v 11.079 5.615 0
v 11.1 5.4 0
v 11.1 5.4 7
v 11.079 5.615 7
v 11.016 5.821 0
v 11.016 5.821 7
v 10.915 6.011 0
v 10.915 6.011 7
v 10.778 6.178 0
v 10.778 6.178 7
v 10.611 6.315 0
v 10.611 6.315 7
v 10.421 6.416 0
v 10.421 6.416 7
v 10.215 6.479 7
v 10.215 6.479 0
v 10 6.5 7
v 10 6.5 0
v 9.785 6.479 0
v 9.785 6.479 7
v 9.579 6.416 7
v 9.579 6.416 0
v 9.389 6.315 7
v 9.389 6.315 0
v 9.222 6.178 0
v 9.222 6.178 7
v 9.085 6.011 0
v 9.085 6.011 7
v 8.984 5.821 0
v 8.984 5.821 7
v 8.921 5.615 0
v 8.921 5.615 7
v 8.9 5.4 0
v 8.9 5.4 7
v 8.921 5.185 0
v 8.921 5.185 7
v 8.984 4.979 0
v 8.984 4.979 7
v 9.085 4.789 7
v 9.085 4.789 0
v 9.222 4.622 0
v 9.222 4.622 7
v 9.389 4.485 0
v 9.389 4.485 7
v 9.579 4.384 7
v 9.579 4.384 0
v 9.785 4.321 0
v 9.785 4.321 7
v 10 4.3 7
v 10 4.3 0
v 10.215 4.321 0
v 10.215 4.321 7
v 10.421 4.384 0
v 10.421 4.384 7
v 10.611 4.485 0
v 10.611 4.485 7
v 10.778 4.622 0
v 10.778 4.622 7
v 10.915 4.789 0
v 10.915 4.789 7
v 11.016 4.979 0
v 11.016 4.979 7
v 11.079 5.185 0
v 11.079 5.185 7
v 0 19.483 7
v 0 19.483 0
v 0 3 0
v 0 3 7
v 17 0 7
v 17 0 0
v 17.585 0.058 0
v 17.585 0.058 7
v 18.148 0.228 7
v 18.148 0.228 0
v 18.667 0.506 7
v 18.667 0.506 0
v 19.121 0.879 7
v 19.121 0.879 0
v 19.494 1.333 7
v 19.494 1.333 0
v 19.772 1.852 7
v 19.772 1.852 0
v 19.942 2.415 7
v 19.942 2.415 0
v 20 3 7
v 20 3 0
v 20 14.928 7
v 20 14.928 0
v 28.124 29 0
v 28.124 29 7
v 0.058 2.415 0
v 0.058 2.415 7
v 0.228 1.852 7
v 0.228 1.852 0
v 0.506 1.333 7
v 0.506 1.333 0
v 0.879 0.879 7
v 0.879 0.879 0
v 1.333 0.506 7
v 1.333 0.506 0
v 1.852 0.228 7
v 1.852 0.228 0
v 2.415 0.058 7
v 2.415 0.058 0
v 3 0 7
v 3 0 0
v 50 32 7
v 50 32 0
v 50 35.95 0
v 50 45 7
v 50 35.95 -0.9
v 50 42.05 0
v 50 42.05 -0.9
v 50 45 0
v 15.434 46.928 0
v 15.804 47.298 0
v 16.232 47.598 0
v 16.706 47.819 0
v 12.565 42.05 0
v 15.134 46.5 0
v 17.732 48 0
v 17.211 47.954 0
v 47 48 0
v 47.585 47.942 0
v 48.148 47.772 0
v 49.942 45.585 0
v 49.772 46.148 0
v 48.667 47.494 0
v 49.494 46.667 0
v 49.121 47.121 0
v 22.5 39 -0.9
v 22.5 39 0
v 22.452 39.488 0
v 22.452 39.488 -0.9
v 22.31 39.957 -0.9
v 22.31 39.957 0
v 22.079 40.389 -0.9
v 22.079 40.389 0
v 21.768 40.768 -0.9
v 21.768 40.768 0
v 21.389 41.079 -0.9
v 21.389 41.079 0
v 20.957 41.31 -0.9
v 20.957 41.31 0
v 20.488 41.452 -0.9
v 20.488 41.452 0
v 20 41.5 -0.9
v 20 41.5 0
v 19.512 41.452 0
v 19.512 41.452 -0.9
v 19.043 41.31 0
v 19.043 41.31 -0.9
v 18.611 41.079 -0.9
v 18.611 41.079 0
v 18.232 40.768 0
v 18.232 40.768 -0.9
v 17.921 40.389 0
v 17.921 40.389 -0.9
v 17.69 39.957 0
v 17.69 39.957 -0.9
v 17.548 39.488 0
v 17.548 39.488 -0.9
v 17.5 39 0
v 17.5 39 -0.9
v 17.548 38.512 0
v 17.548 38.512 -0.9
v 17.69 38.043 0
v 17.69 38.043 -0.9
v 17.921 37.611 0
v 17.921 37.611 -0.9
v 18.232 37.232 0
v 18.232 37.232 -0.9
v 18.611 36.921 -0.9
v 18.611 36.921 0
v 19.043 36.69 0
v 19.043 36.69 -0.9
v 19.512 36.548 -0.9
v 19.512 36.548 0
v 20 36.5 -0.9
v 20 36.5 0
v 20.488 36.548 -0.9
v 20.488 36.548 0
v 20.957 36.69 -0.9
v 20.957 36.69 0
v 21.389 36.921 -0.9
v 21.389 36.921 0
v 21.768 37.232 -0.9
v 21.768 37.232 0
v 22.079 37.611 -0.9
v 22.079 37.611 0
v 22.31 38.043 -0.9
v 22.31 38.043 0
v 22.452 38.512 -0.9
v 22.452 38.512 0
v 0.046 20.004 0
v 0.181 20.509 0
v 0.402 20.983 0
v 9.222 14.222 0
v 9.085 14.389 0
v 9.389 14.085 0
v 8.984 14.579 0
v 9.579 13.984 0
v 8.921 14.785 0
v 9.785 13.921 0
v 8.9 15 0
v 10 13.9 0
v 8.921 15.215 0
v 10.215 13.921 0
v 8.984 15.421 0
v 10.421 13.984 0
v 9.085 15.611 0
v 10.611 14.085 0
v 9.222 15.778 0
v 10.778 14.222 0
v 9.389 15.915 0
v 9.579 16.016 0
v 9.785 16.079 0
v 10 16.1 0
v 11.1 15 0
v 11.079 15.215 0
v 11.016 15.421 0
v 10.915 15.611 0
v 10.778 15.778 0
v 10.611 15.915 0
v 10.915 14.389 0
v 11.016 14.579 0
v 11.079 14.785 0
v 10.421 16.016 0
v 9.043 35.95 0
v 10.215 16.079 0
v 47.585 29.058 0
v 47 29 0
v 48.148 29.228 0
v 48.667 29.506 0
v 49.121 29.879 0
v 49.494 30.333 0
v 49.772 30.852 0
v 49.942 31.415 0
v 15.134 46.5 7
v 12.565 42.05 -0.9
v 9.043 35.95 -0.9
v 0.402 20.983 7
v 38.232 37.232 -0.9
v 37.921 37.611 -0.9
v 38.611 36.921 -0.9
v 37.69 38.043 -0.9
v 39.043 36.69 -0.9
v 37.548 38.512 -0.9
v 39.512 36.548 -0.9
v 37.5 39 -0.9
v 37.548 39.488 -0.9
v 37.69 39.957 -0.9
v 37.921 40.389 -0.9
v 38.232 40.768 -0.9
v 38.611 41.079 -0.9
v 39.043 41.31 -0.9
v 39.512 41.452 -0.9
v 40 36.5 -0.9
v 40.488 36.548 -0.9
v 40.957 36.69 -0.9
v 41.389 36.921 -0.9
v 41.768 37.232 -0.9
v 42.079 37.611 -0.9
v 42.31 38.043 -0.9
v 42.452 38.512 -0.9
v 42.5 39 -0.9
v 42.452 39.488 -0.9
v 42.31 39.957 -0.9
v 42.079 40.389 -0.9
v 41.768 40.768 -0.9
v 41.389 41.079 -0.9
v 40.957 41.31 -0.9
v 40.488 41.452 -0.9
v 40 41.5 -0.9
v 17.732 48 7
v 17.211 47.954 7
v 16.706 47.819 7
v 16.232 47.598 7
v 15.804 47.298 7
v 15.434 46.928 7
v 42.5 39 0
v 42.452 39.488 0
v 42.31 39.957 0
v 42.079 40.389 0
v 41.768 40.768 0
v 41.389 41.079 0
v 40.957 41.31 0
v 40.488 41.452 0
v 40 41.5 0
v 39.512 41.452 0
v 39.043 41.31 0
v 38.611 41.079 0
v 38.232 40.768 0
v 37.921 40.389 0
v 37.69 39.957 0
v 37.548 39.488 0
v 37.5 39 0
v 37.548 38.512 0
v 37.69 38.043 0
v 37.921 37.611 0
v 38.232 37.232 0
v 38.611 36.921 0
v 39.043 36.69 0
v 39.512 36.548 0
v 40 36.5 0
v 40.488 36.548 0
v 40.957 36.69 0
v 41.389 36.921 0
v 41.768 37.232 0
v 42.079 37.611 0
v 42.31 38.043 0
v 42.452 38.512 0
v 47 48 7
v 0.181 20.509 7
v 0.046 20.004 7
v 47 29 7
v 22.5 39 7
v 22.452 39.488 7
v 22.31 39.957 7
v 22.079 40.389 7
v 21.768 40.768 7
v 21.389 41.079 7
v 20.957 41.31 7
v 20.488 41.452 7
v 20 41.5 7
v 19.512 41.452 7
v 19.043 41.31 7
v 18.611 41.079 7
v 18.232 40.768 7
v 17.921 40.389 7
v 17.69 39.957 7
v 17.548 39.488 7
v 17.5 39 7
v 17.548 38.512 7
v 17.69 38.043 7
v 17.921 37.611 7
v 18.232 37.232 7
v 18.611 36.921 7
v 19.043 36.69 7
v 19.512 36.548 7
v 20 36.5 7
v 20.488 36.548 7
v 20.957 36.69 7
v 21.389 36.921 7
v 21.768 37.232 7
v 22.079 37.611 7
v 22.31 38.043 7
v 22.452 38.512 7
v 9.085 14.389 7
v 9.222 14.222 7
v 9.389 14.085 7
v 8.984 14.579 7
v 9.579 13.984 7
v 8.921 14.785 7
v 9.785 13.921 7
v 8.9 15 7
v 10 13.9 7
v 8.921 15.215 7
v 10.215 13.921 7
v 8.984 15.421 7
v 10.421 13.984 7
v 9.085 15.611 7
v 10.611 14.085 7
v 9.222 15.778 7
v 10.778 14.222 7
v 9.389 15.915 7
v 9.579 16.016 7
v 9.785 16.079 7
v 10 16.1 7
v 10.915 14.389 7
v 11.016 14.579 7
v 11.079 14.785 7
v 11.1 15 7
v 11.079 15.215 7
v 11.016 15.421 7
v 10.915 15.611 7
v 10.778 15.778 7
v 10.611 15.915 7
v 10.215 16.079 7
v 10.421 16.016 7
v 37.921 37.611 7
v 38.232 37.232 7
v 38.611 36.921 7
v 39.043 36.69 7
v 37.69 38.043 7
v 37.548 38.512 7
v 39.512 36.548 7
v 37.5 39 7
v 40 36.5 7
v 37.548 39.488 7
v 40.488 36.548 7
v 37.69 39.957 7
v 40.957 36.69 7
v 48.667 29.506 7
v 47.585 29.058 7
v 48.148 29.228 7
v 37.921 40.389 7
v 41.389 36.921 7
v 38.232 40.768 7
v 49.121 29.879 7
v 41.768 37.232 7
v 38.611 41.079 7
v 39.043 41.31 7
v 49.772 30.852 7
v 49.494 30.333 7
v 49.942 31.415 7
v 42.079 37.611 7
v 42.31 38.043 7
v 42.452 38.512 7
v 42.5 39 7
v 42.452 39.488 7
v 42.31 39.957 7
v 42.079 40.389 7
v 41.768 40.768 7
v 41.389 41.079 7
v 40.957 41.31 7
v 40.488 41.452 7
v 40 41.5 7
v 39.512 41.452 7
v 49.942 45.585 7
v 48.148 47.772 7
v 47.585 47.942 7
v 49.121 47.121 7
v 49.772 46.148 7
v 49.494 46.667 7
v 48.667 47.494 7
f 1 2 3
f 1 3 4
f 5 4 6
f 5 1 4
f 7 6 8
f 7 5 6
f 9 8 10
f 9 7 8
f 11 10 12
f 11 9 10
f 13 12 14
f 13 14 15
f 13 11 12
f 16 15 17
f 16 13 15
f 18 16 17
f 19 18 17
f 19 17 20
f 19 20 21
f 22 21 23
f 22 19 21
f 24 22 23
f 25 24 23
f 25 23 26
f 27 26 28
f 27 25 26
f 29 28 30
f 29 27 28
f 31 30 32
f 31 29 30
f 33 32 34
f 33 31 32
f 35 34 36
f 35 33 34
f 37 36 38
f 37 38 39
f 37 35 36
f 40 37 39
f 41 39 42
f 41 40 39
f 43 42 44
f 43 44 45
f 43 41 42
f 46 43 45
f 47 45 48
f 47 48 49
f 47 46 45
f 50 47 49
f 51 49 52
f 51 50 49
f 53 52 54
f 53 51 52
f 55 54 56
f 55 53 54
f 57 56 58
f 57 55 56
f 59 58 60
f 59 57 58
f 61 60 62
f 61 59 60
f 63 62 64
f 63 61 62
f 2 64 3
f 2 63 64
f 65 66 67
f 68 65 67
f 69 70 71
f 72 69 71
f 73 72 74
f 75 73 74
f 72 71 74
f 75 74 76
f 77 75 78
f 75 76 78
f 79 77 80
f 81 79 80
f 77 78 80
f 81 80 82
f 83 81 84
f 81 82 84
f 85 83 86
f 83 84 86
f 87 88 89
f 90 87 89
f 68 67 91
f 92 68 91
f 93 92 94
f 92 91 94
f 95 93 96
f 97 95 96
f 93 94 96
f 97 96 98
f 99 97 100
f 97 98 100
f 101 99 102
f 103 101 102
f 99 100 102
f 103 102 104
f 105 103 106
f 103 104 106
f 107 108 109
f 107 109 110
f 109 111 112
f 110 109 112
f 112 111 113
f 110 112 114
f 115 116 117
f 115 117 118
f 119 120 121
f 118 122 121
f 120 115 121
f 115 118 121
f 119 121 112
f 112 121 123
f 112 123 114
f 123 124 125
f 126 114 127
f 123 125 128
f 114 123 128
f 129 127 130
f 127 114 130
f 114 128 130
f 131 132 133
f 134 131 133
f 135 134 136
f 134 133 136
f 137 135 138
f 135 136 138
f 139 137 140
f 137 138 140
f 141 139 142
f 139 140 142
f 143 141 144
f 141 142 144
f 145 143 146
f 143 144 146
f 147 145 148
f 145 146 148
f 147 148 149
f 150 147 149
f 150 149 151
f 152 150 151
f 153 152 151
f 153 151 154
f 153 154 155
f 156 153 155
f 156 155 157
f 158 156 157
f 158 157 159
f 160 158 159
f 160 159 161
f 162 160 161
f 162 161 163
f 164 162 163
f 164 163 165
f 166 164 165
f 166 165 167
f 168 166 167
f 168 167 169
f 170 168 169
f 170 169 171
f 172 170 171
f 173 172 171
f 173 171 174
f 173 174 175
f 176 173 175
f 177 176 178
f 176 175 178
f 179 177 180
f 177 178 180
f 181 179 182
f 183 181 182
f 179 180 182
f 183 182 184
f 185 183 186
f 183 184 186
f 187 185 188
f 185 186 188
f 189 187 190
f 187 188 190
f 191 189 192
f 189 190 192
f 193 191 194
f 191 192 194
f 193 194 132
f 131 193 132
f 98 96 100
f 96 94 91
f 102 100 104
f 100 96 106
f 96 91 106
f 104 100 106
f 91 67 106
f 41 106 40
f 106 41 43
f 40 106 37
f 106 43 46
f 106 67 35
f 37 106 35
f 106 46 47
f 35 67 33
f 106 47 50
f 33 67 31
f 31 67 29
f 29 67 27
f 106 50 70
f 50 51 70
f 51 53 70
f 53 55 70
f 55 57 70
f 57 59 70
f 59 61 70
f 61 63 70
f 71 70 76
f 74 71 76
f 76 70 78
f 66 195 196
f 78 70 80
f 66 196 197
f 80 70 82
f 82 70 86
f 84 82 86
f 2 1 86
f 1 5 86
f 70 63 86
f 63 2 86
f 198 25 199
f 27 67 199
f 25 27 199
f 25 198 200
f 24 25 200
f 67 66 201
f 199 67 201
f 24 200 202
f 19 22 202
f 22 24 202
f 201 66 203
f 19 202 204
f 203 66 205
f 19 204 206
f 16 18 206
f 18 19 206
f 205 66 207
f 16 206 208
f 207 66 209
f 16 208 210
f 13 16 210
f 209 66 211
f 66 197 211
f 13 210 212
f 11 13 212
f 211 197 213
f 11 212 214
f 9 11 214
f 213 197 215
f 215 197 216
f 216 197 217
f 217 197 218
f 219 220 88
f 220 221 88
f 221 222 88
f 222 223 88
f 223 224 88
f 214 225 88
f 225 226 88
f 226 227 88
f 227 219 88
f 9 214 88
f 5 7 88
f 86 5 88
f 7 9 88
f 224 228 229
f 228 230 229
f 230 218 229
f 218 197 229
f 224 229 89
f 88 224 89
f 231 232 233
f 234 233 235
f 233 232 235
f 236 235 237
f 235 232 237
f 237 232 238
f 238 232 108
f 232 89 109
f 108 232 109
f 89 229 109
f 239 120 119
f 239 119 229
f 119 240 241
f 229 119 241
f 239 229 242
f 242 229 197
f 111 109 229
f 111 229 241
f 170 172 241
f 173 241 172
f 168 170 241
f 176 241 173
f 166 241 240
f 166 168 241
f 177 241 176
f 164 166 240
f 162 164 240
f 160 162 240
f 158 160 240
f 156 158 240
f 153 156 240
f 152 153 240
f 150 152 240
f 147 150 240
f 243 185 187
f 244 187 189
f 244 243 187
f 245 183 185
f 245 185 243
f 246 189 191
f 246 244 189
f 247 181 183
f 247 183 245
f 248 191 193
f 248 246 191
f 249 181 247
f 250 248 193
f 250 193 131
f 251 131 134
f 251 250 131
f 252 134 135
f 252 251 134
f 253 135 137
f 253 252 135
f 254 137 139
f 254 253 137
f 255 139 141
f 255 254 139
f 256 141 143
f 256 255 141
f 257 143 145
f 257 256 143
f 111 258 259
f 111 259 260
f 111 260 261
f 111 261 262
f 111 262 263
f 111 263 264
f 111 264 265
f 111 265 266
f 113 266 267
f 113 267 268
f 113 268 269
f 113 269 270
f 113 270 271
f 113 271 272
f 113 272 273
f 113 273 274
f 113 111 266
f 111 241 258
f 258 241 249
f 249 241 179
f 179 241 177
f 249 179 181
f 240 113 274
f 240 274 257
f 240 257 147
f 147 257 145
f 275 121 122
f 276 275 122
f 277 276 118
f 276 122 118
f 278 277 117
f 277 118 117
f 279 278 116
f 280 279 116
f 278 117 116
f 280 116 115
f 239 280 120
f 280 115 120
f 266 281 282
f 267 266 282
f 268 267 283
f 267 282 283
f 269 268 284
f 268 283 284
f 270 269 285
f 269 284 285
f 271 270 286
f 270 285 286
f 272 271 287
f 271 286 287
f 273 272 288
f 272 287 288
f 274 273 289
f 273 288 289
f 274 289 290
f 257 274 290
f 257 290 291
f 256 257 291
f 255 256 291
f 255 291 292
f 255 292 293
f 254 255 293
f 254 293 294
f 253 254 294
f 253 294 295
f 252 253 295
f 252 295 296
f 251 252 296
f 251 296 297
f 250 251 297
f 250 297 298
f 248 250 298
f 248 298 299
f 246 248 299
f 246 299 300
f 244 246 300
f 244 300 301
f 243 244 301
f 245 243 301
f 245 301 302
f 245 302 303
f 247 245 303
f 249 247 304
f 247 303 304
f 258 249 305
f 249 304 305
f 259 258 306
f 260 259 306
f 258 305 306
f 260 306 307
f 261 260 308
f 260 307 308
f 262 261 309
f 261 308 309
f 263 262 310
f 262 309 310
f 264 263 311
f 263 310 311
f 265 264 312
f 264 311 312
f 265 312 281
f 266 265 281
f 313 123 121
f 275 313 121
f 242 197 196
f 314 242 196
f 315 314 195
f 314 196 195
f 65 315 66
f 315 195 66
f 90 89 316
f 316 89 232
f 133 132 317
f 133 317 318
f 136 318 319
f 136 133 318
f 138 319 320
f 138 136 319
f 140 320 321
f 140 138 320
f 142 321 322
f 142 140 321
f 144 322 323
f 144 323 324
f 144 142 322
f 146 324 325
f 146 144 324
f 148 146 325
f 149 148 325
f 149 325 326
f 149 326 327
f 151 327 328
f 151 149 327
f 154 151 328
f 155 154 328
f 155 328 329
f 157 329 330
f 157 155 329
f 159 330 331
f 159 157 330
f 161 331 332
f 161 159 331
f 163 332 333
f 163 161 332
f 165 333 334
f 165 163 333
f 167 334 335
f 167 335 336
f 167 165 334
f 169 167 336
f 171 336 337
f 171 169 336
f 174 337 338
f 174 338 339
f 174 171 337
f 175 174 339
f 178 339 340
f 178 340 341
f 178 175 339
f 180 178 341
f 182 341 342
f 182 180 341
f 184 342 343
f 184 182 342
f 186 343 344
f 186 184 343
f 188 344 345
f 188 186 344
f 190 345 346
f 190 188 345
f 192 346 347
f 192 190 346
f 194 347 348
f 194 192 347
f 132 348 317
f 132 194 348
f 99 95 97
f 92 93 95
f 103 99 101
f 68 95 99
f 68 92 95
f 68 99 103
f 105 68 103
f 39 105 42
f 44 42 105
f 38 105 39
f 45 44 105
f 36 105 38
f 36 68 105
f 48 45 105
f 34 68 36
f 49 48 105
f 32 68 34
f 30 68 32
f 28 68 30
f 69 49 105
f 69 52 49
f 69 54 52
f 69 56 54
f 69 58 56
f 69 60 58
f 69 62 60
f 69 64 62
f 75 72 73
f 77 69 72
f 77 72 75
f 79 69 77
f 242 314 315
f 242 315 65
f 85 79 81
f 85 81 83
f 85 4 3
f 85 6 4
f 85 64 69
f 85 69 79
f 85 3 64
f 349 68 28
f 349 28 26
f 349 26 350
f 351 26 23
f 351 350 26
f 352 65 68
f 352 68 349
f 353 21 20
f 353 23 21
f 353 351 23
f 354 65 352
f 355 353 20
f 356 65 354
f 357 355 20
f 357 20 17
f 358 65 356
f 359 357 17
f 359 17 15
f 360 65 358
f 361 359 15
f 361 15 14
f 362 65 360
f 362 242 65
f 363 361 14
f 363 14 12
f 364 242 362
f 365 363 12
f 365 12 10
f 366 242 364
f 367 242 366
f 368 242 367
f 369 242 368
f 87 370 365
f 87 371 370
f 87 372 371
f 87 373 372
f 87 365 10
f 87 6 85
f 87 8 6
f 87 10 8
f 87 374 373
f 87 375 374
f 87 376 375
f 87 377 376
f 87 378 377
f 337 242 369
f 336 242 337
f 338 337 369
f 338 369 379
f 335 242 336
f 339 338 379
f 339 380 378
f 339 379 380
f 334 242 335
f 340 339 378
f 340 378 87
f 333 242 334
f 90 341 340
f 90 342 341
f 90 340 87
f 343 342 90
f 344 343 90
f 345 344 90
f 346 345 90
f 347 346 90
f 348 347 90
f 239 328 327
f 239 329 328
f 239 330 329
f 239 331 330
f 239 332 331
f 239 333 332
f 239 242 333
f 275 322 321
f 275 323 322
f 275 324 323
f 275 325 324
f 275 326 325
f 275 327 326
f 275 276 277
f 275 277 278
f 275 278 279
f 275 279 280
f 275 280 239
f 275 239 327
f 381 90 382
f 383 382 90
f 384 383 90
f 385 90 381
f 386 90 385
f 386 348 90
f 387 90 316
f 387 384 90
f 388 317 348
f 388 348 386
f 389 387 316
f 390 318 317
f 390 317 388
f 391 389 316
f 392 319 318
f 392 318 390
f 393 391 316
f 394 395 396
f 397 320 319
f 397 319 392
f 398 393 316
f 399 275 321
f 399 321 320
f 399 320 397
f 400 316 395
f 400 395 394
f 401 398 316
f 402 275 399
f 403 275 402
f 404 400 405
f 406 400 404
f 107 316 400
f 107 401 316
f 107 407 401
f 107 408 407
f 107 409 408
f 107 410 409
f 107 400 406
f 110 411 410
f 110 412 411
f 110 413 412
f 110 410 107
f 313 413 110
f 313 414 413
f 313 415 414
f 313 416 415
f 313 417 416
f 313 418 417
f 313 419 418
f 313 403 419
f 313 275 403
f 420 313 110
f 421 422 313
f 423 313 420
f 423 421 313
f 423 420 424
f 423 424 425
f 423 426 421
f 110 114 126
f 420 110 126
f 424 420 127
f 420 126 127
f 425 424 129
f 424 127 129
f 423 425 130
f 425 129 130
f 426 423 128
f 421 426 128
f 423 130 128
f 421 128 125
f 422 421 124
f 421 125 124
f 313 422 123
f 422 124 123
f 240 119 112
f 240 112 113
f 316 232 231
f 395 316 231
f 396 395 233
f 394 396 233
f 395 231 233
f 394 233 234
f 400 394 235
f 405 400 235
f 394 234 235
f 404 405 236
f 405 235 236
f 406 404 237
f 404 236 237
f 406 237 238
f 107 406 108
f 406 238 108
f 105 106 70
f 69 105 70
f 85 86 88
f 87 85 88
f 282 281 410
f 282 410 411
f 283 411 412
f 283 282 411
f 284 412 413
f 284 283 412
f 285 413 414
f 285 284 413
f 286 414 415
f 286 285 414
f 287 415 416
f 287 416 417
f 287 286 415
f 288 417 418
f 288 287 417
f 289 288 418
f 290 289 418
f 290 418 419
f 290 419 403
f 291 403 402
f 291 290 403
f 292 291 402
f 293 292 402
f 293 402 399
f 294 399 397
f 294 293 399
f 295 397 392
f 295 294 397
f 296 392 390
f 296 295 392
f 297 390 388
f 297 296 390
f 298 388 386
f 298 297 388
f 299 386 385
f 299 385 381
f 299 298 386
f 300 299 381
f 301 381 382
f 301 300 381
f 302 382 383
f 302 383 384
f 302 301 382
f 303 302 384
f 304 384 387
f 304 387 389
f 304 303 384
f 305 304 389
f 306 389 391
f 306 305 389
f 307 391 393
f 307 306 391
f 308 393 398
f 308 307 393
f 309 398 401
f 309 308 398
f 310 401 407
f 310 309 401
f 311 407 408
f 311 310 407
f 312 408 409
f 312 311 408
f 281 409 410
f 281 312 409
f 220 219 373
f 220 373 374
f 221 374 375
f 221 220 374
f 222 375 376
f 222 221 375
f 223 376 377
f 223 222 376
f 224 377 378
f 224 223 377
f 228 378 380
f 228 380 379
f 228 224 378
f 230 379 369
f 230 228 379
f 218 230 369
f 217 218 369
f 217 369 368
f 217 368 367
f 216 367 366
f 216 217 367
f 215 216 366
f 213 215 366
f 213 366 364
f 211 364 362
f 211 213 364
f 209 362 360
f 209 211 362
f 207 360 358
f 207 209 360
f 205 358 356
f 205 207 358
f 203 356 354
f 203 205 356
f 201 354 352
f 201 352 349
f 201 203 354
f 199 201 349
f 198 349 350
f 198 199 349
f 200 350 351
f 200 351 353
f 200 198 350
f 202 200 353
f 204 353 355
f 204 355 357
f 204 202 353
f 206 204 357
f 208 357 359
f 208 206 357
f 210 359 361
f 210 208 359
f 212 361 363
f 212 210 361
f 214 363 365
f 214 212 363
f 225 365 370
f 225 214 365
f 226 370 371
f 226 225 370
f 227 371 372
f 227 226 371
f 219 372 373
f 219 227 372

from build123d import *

# Parameters (mm, degrees)
SKETCH1_R           = 2.5
SKETCH1_R_2         = 1.1
BOSS_EXTRUDE1_DEPTH = 7
BOSS_EXTRUDE2_REACH = 52
SKETCH2_W           = 0.9
SKETCH2_H           = 6.1
CUT_EXTRUDE1_REACH  = 2.9
SKETCH3_R           = 2.5


with BuildPart() as part:
    # Sketch1 → Boss-Extrude1 (new body)
    with BuildSketch(Plane.XY):
        with BuildLine():
            Line((3, 0), (17, 0))
            ThreePointArc((17, 0), (19.121320344, 0.878679656), (20, 3))
            Line((20, 3), (20, 14.92820323))
            Line((20, 14.92820323), (28.124355653, 29))
            Line((28.124355653, 29), (47, 29))
            ThreePointArc((47, 29), (49.121320344, 29.878679656), (50, 32))
            Line((50, 32), (50, 45))
            ThreePointArc((50, 45), (49.121320344, 47.121320344), (47, 48))
            Line((47, 48), (17.732050808, 48))
            ThreePointArc((17.732050808, 48), (16.232050808, 47.598076211), (15.133974596, 46.5))
            Line((15.133974596, 46.5), (0.401923789, 20.983339502))
            ThreePointArc((0.401923789, 20.983339502), (0.102222521, 20.259796637), (0, 19.483339502))
            Line((0, 19.483339502), (0, 3))
            ThreePointArc((0, 3), (0.878679656, 0.878679656), (3, 0))
        make_face()
        with Locations((20, 39)):
            Circle(SKETCH1_R, mode=Mode.SUBTRACT)
        with Locations((40, 39)):
            Circle(SKETCH1_R, mode=Mode.SUBTRACT)
        with Locations((10, 5.4)):
            Circle(SKETCH1_R_2, mode=Mode.SUBTRACT)
        with Locations((10, 15)):
            Circle(SKETCH1_R_2, mode=Mode.SUBTRACT)
    extrude(amount=BOSS_EXTRUDE1_DEPTH)

    # Boss-Extrude2: up to this face of the body (flat: up to its plane)
    boss_extrude2_end = Plane(part.part.faces().sort_by_distance((7.767949192, 33.741669751, 3.5))[0])
    # Sketch2 → Boss-Extrude2 (add, up to the picked face)
    with BuildSketch(Plane(origin=(50, 0, 0), x_dir=(0, 0, -1), z_dir=(1, 0, 0)), mode=Mode.PRIVATE) as boss_extrude2_sk1:
        with Locations((0.45, 39)):
            Rectangle(SKETCH2_W, SKETCH2_H)
    boss_extrude2_tool1 = split(extrude(boss_extrude2_sk1.sketch, amount=-BOSS_EXTRUDE2_REACH, mode=Mode.PRIVATE), bisect_by=boss_extrude2_end, keep=Keep.BOTH, mode=Mode.PRIVATE)
    add(boss_extrude2_tool1.solids().sort_by_distance((50, 39, -0.45))[0])

    # Sketch3 → Cut-Extrude1 (cut, up to next)
    with BuildSketch(Plane.XY, mode=Mode.PRIVATE) as cut_extrude1_sk1:
        with Locations((20, 39)):
            Circle(SKETCH3_R)
    cut_extrude1_tool1 = extrude(cut_extrude1_sk1.sketch, amount=-CUT_EXTRUDE1_REACH, mode=Mode.PRIVATE) & part.part
    add(cut_extrude1_tool1.solids().sort_by_distance((20, 39, 0))[0], mode=Mode.SUBTRACT)
    # Sketch3 → Cut-Extrude1 (cut, up to next)
    with BuildSketch(Plane.XY, mode=Mode.PRIVATE) as cut_extrude1_sk2:
        with Locations((40, 39)):
            Circle(SKETCH3_R)
    cut_extrude1_tool2 = extrude(cut_extrude1_sk2.sketch, amount=-CUT_EXTRUDE1_REACH, mode=Mode.PRIVATE) & part.part
    add(cut_extrude1_tool2.solids().sort_by_distance((40, 39, 0))[0], mode=Mode.SUBTRACT)


solid = part.part
